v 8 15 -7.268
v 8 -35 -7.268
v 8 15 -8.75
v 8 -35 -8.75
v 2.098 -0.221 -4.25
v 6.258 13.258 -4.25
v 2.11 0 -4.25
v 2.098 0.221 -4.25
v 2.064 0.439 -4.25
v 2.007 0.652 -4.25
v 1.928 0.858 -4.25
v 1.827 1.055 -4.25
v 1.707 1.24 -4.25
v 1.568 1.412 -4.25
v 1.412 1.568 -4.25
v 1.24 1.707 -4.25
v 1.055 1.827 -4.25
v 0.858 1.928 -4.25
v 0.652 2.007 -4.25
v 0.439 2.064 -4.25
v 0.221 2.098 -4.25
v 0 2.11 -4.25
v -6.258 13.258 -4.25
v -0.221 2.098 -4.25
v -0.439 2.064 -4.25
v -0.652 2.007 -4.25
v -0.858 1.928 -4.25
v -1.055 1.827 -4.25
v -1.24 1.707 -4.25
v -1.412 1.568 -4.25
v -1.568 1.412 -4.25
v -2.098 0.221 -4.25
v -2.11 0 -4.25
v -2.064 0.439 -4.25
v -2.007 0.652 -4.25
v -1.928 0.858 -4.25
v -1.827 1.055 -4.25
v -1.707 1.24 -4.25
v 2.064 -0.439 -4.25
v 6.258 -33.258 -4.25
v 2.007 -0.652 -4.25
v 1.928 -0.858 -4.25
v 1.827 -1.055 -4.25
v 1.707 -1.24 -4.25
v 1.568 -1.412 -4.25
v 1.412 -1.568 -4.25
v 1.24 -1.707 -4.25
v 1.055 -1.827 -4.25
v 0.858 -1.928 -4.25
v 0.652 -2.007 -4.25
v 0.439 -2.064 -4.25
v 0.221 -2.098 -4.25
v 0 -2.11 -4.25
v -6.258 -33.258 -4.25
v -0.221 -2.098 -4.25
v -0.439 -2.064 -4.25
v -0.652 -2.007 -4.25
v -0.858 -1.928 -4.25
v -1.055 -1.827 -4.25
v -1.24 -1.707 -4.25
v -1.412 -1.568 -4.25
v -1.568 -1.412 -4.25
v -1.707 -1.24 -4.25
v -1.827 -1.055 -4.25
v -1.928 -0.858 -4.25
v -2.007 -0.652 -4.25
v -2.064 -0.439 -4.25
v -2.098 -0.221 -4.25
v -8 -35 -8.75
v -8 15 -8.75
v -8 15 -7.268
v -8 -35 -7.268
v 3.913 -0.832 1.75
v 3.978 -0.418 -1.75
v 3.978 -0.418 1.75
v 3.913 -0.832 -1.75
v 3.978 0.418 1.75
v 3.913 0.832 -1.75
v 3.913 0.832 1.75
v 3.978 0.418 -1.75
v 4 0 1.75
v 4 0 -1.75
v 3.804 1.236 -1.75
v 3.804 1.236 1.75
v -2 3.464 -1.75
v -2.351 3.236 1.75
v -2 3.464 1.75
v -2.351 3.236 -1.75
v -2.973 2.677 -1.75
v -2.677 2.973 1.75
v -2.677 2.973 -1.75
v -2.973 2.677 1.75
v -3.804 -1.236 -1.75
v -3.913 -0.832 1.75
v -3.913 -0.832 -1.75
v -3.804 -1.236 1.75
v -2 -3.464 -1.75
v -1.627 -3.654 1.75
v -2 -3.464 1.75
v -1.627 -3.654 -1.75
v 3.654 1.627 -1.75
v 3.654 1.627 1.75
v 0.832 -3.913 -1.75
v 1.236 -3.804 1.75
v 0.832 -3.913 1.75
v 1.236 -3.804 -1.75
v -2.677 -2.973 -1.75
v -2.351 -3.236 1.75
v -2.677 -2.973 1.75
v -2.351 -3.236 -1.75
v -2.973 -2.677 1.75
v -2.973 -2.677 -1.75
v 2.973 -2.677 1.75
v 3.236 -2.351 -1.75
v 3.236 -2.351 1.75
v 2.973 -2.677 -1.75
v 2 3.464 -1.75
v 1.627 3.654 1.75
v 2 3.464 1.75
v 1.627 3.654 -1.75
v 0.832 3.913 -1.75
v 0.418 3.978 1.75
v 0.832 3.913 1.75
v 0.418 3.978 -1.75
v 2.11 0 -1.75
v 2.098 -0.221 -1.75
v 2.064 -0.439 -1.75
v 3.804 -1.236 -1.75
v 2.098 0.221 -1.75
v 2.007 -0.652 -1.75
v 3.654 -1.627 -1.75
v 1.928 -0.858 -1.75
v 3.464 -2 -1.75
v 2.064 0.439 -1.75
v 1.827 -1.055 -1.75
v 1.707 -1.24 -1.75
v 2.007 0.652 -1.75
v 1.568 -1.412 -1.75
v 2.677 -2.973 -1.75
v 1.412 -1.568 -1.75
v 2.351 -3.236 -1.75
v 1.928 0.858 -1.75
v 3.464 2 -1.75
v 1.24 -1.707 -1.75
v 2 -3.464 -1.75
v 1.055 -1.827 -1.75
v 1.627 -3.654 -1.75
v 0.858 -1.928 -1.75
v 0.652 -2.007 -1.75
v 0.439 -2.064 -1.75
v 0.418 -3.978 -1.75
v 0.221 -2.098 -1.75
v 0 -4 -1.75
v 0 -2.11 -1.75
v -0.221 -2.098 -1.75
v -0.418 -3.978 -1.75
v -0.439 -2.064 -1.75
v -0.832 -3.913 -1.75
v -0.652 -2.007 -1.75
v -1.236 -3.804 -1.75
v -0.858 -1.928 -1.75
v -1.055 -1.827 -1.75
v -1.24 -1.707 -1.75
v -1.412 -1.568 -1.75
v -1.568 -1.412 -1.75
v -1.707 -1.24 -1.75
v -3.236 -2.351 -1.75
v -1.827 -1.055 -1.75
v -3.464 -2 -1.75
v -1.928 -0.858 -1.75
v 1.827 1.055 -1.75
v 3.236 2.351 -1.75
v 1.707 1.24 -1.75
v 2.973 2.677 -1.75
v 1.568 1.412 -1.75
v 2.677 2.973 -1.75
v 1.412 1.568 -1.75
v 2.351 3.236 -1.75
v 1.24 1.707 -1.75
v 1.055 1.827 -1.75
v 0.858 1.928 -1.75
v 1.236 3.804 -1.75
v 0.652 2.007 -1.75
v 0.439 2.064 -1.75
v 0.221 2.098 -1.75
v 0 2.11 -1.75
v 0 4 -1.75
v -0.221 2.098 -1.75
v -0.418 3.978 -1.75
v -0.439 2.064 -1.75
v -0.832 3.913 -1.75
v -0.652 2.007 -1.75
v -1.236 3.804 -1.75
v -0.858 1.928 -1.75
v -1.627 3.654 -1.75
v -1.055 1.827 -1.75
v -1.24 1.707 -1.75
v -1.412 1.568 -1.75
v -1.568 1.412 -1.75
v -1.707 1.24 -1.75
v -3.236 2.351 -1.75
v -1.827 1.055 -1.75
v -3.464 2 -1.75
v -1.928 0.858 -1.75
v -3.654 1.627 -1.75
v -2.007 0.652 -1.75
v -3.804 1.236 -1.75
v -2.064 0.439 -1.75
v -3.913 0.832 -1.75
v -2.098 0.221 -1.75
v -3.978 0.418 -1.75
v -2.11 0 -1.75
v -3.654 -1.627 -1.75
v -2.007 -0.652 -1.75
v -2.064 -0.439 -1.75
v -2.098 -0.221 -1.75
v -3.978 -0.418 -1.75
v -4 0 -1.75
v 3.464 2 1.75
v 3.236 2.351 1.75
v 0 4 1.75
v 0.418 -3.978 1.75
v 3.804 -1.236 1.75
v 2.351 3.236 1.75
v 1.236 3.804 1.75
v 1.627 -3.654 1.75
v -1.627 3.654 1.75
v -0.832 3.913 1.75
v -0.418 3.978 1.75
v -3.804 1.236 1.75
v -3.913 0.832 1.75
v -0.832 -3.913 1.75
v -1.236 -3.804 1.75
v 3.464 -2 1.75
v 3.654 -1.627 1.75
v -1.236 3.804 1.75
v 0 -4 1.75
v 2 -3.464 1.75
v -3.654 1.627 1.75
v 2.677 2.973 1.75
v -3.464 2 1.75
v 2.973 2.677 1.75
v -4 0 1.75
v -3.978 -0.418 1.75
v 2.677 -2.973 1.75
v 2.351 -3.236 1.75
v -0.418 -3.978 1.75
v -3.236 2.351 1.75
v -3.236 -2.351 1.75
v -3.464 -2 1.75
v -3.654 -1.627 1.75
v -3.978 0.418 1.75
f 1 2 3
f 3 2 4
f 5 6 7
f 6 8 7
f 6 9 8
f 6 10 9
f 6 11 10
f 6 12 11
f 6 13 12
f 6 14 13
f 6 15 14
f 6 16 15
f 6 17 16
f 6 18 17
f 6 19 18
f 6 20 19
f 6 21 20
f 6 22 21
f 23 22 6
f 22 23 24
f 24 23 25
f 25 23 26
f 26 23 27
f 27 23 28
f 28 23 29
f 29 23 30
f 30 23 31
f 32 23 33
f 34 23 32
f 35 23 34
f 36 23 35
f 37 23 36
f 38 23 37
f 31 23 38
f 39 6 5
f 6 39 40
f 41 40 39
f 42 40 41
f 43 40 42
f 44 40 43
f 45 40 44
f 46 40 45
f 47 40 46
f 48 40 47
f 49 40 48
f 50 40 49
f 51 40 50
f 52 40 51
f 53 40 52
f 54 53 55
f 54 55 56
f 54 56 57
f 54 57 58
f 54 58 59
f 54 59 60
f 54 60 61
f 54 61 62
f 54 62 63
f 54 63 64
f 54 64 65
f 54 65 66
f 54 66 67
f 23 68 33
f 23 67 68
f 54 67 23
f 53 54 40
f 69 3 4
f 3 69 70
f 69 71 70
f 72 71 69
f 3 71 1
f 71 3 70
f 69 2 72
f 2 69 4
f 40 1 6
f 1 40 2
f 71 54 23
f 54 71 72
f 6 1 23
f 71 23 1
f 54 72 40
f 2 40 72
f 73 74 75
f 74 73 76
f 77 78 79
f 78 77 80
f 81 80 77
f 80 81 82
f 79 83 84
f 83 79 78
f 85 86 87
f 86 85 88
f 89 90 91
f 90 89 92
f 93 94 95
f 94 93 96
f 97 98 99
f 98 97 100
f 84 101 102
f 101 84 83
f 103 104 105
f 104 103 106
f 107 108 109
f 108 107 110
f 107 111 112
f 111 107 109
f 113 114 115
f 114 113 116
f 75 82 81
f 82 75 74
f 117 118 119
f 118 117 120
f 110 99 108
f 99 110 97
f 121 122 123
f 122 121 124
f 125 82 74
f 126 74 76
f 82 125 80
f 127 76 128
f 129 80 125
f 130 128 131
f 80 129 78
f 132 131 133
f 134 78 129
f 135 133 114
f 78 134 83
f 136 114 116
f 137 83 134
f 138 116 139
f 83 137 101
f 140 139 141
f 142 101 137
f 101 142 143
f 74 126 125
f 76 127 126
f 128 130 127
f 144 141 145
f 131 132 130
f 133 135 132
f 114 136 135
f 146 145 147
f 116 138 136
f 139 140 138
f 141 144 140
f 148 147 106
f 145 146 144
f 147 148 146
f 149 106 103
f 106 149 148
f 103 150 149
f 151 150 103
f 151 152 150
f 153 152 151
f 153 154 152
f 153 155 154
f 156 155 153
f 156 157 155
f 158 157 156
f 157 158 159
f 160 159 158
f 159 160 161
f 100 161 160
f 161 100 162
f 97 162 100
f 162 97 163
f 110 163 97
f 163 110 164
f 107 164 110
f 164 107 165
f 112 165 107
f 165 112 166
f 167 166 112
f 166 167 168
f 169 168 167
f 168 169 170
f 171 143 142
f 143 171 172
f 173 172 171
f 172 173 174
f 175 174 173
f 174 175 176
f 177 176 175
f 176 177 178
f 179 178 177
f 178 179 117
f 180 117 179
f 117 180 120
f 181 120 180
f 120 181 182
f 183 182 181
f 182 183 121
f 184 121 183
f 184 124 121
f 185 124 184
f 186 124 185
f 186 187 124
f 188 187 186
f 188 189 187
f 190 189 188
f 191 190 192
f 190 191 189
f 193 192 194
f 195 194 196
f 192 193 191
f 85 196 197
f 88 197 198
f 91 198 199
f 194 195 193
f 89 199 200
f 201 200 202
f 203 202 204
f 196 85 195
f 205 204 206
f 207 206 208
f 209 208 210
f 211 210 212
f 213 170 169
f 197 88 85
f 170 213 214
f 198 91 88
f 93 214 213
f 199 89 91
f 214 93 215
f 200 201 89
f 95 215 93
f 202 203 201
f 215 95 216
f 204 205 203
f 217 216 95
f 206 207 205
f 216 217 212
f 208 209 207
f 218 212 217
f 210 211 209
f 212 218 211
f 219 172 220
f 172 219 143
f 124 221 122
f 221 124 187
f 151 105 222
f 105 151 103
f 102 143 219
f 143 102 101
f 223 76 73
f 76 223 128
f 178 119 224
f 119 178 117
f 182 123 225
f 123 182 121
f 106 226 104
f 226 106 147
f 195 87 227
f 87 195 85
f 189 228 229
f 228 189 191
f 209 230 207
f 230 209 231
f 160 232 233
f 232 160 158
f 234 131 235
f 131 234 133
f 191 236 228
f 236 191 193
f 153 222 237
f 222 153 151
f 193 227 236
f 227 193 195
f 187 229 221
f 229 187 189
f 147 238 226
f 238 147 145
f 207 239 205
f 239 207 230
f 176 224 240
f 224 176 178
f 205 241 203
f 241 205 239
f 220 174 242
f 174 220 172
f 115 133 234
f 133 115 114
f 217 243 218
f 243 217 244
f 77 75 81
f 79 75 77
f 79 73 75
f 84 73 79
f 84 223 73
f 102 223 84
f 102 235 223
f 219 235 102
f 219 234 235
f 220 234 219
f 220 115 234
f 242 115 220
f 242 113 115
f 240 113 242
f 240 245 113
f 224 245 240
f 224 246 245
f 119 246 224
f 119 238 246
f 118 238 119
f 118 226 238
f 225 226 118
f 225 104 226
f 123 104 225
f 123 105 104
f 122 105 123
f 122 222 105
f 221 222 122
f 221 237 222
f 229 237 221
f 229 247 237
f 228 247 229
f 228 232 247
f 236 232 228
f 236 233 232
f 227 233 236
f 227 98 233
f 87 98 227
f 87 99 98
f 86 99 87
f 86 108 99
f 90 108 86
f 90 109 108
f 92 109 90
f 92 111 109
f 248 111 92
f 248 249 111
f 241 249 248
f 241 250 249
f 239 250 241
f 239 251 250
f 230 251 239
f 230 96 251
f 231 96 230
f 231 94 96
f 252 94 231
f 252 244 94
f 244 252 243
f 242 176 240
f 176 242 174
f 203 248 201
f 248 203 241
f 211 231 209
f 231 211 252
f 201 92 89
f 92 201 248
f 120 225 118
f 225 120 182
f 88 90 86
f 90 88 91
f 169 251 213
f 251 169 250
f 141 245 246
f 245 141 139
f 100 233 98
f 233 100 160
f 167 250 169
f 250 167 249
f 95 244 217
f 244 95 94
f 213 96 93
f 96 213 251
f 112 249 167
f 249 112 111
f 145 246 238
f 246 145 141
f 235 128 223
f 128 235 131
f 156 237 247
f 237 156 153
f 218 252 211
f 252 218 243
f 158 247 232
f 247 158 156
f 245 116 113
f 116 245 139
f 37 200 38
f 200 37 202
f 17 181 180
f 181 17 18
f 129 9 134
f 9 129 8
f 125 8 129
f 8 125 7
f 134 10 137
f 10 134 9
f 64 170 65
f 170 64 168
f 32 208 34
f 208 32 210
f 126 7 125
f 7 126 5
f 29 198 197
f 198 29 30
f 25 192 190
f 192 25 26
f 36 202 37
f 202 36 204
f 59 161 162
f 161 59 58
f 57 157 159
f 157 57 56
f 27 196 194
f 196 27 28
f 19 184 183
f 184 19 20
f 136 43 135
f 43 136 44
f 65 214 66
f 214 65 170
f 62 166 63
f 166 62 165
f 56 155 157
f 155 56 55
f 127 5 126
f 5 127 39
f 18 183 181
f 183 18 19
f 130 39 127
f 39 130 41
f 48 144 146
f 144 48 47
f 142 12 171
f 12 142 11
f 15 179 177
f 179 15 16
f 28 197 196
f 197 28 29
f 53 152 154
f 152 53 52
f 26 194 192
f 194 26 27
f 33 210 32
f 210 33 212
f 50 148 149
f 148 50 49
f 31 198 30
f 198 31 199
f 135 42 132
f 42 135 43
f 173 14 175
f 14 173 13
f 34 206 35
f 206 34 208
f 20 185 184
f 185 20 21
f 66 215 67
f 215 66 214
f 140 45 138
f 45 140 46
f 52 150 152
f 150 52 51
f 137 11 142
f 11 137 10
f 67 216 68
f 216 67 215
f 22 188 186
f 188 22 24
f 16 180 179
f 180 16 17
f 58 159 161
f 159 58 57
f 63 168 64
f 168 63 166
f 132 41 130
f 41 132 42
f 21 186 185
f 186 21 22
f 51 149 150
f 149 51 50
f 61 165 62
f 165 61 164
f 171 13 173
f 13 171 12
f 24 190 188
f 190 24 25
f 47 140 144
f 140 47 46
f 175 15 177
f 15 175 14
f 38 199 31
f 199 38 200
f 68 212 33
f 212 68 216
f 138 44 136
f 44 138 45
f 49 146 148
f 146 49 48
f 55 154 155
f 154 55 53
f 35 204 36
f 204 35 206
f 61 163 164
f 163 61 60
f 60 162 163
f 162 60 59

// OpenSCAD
$fn = 60;
cylinder(d=8,h=3.5,center=true); // Pin Head

translate([0,0,-3])
	cylinder(d=4.22,h=6,center=true); // Center Pin

//translate([0,0,-3.5])	cube([10,10,3.5],center=true); // Spacer
difference(){
	translate([0,-10,-6.5])
		cube([16,50,4.5],center=true); // Back Plate

	translate([9,-10,-4])
		rotate([0,60,0])	
			cube([5,55,5],center=true);
	
	mirror([180,0,0])
		translate([9,-10,-4])
			rotate([0,60,0])	
				cube([5,55,5],center=true);
	
		translate([9,16,-4])
			rotate([0,60,90])	
				cube([15,55,5],center=true);
	
	mirror([180,0,0])
		translate([9,-36,-4])
			rotate([0,-60,90])	
				cube([15,55,5],center=true);
}
